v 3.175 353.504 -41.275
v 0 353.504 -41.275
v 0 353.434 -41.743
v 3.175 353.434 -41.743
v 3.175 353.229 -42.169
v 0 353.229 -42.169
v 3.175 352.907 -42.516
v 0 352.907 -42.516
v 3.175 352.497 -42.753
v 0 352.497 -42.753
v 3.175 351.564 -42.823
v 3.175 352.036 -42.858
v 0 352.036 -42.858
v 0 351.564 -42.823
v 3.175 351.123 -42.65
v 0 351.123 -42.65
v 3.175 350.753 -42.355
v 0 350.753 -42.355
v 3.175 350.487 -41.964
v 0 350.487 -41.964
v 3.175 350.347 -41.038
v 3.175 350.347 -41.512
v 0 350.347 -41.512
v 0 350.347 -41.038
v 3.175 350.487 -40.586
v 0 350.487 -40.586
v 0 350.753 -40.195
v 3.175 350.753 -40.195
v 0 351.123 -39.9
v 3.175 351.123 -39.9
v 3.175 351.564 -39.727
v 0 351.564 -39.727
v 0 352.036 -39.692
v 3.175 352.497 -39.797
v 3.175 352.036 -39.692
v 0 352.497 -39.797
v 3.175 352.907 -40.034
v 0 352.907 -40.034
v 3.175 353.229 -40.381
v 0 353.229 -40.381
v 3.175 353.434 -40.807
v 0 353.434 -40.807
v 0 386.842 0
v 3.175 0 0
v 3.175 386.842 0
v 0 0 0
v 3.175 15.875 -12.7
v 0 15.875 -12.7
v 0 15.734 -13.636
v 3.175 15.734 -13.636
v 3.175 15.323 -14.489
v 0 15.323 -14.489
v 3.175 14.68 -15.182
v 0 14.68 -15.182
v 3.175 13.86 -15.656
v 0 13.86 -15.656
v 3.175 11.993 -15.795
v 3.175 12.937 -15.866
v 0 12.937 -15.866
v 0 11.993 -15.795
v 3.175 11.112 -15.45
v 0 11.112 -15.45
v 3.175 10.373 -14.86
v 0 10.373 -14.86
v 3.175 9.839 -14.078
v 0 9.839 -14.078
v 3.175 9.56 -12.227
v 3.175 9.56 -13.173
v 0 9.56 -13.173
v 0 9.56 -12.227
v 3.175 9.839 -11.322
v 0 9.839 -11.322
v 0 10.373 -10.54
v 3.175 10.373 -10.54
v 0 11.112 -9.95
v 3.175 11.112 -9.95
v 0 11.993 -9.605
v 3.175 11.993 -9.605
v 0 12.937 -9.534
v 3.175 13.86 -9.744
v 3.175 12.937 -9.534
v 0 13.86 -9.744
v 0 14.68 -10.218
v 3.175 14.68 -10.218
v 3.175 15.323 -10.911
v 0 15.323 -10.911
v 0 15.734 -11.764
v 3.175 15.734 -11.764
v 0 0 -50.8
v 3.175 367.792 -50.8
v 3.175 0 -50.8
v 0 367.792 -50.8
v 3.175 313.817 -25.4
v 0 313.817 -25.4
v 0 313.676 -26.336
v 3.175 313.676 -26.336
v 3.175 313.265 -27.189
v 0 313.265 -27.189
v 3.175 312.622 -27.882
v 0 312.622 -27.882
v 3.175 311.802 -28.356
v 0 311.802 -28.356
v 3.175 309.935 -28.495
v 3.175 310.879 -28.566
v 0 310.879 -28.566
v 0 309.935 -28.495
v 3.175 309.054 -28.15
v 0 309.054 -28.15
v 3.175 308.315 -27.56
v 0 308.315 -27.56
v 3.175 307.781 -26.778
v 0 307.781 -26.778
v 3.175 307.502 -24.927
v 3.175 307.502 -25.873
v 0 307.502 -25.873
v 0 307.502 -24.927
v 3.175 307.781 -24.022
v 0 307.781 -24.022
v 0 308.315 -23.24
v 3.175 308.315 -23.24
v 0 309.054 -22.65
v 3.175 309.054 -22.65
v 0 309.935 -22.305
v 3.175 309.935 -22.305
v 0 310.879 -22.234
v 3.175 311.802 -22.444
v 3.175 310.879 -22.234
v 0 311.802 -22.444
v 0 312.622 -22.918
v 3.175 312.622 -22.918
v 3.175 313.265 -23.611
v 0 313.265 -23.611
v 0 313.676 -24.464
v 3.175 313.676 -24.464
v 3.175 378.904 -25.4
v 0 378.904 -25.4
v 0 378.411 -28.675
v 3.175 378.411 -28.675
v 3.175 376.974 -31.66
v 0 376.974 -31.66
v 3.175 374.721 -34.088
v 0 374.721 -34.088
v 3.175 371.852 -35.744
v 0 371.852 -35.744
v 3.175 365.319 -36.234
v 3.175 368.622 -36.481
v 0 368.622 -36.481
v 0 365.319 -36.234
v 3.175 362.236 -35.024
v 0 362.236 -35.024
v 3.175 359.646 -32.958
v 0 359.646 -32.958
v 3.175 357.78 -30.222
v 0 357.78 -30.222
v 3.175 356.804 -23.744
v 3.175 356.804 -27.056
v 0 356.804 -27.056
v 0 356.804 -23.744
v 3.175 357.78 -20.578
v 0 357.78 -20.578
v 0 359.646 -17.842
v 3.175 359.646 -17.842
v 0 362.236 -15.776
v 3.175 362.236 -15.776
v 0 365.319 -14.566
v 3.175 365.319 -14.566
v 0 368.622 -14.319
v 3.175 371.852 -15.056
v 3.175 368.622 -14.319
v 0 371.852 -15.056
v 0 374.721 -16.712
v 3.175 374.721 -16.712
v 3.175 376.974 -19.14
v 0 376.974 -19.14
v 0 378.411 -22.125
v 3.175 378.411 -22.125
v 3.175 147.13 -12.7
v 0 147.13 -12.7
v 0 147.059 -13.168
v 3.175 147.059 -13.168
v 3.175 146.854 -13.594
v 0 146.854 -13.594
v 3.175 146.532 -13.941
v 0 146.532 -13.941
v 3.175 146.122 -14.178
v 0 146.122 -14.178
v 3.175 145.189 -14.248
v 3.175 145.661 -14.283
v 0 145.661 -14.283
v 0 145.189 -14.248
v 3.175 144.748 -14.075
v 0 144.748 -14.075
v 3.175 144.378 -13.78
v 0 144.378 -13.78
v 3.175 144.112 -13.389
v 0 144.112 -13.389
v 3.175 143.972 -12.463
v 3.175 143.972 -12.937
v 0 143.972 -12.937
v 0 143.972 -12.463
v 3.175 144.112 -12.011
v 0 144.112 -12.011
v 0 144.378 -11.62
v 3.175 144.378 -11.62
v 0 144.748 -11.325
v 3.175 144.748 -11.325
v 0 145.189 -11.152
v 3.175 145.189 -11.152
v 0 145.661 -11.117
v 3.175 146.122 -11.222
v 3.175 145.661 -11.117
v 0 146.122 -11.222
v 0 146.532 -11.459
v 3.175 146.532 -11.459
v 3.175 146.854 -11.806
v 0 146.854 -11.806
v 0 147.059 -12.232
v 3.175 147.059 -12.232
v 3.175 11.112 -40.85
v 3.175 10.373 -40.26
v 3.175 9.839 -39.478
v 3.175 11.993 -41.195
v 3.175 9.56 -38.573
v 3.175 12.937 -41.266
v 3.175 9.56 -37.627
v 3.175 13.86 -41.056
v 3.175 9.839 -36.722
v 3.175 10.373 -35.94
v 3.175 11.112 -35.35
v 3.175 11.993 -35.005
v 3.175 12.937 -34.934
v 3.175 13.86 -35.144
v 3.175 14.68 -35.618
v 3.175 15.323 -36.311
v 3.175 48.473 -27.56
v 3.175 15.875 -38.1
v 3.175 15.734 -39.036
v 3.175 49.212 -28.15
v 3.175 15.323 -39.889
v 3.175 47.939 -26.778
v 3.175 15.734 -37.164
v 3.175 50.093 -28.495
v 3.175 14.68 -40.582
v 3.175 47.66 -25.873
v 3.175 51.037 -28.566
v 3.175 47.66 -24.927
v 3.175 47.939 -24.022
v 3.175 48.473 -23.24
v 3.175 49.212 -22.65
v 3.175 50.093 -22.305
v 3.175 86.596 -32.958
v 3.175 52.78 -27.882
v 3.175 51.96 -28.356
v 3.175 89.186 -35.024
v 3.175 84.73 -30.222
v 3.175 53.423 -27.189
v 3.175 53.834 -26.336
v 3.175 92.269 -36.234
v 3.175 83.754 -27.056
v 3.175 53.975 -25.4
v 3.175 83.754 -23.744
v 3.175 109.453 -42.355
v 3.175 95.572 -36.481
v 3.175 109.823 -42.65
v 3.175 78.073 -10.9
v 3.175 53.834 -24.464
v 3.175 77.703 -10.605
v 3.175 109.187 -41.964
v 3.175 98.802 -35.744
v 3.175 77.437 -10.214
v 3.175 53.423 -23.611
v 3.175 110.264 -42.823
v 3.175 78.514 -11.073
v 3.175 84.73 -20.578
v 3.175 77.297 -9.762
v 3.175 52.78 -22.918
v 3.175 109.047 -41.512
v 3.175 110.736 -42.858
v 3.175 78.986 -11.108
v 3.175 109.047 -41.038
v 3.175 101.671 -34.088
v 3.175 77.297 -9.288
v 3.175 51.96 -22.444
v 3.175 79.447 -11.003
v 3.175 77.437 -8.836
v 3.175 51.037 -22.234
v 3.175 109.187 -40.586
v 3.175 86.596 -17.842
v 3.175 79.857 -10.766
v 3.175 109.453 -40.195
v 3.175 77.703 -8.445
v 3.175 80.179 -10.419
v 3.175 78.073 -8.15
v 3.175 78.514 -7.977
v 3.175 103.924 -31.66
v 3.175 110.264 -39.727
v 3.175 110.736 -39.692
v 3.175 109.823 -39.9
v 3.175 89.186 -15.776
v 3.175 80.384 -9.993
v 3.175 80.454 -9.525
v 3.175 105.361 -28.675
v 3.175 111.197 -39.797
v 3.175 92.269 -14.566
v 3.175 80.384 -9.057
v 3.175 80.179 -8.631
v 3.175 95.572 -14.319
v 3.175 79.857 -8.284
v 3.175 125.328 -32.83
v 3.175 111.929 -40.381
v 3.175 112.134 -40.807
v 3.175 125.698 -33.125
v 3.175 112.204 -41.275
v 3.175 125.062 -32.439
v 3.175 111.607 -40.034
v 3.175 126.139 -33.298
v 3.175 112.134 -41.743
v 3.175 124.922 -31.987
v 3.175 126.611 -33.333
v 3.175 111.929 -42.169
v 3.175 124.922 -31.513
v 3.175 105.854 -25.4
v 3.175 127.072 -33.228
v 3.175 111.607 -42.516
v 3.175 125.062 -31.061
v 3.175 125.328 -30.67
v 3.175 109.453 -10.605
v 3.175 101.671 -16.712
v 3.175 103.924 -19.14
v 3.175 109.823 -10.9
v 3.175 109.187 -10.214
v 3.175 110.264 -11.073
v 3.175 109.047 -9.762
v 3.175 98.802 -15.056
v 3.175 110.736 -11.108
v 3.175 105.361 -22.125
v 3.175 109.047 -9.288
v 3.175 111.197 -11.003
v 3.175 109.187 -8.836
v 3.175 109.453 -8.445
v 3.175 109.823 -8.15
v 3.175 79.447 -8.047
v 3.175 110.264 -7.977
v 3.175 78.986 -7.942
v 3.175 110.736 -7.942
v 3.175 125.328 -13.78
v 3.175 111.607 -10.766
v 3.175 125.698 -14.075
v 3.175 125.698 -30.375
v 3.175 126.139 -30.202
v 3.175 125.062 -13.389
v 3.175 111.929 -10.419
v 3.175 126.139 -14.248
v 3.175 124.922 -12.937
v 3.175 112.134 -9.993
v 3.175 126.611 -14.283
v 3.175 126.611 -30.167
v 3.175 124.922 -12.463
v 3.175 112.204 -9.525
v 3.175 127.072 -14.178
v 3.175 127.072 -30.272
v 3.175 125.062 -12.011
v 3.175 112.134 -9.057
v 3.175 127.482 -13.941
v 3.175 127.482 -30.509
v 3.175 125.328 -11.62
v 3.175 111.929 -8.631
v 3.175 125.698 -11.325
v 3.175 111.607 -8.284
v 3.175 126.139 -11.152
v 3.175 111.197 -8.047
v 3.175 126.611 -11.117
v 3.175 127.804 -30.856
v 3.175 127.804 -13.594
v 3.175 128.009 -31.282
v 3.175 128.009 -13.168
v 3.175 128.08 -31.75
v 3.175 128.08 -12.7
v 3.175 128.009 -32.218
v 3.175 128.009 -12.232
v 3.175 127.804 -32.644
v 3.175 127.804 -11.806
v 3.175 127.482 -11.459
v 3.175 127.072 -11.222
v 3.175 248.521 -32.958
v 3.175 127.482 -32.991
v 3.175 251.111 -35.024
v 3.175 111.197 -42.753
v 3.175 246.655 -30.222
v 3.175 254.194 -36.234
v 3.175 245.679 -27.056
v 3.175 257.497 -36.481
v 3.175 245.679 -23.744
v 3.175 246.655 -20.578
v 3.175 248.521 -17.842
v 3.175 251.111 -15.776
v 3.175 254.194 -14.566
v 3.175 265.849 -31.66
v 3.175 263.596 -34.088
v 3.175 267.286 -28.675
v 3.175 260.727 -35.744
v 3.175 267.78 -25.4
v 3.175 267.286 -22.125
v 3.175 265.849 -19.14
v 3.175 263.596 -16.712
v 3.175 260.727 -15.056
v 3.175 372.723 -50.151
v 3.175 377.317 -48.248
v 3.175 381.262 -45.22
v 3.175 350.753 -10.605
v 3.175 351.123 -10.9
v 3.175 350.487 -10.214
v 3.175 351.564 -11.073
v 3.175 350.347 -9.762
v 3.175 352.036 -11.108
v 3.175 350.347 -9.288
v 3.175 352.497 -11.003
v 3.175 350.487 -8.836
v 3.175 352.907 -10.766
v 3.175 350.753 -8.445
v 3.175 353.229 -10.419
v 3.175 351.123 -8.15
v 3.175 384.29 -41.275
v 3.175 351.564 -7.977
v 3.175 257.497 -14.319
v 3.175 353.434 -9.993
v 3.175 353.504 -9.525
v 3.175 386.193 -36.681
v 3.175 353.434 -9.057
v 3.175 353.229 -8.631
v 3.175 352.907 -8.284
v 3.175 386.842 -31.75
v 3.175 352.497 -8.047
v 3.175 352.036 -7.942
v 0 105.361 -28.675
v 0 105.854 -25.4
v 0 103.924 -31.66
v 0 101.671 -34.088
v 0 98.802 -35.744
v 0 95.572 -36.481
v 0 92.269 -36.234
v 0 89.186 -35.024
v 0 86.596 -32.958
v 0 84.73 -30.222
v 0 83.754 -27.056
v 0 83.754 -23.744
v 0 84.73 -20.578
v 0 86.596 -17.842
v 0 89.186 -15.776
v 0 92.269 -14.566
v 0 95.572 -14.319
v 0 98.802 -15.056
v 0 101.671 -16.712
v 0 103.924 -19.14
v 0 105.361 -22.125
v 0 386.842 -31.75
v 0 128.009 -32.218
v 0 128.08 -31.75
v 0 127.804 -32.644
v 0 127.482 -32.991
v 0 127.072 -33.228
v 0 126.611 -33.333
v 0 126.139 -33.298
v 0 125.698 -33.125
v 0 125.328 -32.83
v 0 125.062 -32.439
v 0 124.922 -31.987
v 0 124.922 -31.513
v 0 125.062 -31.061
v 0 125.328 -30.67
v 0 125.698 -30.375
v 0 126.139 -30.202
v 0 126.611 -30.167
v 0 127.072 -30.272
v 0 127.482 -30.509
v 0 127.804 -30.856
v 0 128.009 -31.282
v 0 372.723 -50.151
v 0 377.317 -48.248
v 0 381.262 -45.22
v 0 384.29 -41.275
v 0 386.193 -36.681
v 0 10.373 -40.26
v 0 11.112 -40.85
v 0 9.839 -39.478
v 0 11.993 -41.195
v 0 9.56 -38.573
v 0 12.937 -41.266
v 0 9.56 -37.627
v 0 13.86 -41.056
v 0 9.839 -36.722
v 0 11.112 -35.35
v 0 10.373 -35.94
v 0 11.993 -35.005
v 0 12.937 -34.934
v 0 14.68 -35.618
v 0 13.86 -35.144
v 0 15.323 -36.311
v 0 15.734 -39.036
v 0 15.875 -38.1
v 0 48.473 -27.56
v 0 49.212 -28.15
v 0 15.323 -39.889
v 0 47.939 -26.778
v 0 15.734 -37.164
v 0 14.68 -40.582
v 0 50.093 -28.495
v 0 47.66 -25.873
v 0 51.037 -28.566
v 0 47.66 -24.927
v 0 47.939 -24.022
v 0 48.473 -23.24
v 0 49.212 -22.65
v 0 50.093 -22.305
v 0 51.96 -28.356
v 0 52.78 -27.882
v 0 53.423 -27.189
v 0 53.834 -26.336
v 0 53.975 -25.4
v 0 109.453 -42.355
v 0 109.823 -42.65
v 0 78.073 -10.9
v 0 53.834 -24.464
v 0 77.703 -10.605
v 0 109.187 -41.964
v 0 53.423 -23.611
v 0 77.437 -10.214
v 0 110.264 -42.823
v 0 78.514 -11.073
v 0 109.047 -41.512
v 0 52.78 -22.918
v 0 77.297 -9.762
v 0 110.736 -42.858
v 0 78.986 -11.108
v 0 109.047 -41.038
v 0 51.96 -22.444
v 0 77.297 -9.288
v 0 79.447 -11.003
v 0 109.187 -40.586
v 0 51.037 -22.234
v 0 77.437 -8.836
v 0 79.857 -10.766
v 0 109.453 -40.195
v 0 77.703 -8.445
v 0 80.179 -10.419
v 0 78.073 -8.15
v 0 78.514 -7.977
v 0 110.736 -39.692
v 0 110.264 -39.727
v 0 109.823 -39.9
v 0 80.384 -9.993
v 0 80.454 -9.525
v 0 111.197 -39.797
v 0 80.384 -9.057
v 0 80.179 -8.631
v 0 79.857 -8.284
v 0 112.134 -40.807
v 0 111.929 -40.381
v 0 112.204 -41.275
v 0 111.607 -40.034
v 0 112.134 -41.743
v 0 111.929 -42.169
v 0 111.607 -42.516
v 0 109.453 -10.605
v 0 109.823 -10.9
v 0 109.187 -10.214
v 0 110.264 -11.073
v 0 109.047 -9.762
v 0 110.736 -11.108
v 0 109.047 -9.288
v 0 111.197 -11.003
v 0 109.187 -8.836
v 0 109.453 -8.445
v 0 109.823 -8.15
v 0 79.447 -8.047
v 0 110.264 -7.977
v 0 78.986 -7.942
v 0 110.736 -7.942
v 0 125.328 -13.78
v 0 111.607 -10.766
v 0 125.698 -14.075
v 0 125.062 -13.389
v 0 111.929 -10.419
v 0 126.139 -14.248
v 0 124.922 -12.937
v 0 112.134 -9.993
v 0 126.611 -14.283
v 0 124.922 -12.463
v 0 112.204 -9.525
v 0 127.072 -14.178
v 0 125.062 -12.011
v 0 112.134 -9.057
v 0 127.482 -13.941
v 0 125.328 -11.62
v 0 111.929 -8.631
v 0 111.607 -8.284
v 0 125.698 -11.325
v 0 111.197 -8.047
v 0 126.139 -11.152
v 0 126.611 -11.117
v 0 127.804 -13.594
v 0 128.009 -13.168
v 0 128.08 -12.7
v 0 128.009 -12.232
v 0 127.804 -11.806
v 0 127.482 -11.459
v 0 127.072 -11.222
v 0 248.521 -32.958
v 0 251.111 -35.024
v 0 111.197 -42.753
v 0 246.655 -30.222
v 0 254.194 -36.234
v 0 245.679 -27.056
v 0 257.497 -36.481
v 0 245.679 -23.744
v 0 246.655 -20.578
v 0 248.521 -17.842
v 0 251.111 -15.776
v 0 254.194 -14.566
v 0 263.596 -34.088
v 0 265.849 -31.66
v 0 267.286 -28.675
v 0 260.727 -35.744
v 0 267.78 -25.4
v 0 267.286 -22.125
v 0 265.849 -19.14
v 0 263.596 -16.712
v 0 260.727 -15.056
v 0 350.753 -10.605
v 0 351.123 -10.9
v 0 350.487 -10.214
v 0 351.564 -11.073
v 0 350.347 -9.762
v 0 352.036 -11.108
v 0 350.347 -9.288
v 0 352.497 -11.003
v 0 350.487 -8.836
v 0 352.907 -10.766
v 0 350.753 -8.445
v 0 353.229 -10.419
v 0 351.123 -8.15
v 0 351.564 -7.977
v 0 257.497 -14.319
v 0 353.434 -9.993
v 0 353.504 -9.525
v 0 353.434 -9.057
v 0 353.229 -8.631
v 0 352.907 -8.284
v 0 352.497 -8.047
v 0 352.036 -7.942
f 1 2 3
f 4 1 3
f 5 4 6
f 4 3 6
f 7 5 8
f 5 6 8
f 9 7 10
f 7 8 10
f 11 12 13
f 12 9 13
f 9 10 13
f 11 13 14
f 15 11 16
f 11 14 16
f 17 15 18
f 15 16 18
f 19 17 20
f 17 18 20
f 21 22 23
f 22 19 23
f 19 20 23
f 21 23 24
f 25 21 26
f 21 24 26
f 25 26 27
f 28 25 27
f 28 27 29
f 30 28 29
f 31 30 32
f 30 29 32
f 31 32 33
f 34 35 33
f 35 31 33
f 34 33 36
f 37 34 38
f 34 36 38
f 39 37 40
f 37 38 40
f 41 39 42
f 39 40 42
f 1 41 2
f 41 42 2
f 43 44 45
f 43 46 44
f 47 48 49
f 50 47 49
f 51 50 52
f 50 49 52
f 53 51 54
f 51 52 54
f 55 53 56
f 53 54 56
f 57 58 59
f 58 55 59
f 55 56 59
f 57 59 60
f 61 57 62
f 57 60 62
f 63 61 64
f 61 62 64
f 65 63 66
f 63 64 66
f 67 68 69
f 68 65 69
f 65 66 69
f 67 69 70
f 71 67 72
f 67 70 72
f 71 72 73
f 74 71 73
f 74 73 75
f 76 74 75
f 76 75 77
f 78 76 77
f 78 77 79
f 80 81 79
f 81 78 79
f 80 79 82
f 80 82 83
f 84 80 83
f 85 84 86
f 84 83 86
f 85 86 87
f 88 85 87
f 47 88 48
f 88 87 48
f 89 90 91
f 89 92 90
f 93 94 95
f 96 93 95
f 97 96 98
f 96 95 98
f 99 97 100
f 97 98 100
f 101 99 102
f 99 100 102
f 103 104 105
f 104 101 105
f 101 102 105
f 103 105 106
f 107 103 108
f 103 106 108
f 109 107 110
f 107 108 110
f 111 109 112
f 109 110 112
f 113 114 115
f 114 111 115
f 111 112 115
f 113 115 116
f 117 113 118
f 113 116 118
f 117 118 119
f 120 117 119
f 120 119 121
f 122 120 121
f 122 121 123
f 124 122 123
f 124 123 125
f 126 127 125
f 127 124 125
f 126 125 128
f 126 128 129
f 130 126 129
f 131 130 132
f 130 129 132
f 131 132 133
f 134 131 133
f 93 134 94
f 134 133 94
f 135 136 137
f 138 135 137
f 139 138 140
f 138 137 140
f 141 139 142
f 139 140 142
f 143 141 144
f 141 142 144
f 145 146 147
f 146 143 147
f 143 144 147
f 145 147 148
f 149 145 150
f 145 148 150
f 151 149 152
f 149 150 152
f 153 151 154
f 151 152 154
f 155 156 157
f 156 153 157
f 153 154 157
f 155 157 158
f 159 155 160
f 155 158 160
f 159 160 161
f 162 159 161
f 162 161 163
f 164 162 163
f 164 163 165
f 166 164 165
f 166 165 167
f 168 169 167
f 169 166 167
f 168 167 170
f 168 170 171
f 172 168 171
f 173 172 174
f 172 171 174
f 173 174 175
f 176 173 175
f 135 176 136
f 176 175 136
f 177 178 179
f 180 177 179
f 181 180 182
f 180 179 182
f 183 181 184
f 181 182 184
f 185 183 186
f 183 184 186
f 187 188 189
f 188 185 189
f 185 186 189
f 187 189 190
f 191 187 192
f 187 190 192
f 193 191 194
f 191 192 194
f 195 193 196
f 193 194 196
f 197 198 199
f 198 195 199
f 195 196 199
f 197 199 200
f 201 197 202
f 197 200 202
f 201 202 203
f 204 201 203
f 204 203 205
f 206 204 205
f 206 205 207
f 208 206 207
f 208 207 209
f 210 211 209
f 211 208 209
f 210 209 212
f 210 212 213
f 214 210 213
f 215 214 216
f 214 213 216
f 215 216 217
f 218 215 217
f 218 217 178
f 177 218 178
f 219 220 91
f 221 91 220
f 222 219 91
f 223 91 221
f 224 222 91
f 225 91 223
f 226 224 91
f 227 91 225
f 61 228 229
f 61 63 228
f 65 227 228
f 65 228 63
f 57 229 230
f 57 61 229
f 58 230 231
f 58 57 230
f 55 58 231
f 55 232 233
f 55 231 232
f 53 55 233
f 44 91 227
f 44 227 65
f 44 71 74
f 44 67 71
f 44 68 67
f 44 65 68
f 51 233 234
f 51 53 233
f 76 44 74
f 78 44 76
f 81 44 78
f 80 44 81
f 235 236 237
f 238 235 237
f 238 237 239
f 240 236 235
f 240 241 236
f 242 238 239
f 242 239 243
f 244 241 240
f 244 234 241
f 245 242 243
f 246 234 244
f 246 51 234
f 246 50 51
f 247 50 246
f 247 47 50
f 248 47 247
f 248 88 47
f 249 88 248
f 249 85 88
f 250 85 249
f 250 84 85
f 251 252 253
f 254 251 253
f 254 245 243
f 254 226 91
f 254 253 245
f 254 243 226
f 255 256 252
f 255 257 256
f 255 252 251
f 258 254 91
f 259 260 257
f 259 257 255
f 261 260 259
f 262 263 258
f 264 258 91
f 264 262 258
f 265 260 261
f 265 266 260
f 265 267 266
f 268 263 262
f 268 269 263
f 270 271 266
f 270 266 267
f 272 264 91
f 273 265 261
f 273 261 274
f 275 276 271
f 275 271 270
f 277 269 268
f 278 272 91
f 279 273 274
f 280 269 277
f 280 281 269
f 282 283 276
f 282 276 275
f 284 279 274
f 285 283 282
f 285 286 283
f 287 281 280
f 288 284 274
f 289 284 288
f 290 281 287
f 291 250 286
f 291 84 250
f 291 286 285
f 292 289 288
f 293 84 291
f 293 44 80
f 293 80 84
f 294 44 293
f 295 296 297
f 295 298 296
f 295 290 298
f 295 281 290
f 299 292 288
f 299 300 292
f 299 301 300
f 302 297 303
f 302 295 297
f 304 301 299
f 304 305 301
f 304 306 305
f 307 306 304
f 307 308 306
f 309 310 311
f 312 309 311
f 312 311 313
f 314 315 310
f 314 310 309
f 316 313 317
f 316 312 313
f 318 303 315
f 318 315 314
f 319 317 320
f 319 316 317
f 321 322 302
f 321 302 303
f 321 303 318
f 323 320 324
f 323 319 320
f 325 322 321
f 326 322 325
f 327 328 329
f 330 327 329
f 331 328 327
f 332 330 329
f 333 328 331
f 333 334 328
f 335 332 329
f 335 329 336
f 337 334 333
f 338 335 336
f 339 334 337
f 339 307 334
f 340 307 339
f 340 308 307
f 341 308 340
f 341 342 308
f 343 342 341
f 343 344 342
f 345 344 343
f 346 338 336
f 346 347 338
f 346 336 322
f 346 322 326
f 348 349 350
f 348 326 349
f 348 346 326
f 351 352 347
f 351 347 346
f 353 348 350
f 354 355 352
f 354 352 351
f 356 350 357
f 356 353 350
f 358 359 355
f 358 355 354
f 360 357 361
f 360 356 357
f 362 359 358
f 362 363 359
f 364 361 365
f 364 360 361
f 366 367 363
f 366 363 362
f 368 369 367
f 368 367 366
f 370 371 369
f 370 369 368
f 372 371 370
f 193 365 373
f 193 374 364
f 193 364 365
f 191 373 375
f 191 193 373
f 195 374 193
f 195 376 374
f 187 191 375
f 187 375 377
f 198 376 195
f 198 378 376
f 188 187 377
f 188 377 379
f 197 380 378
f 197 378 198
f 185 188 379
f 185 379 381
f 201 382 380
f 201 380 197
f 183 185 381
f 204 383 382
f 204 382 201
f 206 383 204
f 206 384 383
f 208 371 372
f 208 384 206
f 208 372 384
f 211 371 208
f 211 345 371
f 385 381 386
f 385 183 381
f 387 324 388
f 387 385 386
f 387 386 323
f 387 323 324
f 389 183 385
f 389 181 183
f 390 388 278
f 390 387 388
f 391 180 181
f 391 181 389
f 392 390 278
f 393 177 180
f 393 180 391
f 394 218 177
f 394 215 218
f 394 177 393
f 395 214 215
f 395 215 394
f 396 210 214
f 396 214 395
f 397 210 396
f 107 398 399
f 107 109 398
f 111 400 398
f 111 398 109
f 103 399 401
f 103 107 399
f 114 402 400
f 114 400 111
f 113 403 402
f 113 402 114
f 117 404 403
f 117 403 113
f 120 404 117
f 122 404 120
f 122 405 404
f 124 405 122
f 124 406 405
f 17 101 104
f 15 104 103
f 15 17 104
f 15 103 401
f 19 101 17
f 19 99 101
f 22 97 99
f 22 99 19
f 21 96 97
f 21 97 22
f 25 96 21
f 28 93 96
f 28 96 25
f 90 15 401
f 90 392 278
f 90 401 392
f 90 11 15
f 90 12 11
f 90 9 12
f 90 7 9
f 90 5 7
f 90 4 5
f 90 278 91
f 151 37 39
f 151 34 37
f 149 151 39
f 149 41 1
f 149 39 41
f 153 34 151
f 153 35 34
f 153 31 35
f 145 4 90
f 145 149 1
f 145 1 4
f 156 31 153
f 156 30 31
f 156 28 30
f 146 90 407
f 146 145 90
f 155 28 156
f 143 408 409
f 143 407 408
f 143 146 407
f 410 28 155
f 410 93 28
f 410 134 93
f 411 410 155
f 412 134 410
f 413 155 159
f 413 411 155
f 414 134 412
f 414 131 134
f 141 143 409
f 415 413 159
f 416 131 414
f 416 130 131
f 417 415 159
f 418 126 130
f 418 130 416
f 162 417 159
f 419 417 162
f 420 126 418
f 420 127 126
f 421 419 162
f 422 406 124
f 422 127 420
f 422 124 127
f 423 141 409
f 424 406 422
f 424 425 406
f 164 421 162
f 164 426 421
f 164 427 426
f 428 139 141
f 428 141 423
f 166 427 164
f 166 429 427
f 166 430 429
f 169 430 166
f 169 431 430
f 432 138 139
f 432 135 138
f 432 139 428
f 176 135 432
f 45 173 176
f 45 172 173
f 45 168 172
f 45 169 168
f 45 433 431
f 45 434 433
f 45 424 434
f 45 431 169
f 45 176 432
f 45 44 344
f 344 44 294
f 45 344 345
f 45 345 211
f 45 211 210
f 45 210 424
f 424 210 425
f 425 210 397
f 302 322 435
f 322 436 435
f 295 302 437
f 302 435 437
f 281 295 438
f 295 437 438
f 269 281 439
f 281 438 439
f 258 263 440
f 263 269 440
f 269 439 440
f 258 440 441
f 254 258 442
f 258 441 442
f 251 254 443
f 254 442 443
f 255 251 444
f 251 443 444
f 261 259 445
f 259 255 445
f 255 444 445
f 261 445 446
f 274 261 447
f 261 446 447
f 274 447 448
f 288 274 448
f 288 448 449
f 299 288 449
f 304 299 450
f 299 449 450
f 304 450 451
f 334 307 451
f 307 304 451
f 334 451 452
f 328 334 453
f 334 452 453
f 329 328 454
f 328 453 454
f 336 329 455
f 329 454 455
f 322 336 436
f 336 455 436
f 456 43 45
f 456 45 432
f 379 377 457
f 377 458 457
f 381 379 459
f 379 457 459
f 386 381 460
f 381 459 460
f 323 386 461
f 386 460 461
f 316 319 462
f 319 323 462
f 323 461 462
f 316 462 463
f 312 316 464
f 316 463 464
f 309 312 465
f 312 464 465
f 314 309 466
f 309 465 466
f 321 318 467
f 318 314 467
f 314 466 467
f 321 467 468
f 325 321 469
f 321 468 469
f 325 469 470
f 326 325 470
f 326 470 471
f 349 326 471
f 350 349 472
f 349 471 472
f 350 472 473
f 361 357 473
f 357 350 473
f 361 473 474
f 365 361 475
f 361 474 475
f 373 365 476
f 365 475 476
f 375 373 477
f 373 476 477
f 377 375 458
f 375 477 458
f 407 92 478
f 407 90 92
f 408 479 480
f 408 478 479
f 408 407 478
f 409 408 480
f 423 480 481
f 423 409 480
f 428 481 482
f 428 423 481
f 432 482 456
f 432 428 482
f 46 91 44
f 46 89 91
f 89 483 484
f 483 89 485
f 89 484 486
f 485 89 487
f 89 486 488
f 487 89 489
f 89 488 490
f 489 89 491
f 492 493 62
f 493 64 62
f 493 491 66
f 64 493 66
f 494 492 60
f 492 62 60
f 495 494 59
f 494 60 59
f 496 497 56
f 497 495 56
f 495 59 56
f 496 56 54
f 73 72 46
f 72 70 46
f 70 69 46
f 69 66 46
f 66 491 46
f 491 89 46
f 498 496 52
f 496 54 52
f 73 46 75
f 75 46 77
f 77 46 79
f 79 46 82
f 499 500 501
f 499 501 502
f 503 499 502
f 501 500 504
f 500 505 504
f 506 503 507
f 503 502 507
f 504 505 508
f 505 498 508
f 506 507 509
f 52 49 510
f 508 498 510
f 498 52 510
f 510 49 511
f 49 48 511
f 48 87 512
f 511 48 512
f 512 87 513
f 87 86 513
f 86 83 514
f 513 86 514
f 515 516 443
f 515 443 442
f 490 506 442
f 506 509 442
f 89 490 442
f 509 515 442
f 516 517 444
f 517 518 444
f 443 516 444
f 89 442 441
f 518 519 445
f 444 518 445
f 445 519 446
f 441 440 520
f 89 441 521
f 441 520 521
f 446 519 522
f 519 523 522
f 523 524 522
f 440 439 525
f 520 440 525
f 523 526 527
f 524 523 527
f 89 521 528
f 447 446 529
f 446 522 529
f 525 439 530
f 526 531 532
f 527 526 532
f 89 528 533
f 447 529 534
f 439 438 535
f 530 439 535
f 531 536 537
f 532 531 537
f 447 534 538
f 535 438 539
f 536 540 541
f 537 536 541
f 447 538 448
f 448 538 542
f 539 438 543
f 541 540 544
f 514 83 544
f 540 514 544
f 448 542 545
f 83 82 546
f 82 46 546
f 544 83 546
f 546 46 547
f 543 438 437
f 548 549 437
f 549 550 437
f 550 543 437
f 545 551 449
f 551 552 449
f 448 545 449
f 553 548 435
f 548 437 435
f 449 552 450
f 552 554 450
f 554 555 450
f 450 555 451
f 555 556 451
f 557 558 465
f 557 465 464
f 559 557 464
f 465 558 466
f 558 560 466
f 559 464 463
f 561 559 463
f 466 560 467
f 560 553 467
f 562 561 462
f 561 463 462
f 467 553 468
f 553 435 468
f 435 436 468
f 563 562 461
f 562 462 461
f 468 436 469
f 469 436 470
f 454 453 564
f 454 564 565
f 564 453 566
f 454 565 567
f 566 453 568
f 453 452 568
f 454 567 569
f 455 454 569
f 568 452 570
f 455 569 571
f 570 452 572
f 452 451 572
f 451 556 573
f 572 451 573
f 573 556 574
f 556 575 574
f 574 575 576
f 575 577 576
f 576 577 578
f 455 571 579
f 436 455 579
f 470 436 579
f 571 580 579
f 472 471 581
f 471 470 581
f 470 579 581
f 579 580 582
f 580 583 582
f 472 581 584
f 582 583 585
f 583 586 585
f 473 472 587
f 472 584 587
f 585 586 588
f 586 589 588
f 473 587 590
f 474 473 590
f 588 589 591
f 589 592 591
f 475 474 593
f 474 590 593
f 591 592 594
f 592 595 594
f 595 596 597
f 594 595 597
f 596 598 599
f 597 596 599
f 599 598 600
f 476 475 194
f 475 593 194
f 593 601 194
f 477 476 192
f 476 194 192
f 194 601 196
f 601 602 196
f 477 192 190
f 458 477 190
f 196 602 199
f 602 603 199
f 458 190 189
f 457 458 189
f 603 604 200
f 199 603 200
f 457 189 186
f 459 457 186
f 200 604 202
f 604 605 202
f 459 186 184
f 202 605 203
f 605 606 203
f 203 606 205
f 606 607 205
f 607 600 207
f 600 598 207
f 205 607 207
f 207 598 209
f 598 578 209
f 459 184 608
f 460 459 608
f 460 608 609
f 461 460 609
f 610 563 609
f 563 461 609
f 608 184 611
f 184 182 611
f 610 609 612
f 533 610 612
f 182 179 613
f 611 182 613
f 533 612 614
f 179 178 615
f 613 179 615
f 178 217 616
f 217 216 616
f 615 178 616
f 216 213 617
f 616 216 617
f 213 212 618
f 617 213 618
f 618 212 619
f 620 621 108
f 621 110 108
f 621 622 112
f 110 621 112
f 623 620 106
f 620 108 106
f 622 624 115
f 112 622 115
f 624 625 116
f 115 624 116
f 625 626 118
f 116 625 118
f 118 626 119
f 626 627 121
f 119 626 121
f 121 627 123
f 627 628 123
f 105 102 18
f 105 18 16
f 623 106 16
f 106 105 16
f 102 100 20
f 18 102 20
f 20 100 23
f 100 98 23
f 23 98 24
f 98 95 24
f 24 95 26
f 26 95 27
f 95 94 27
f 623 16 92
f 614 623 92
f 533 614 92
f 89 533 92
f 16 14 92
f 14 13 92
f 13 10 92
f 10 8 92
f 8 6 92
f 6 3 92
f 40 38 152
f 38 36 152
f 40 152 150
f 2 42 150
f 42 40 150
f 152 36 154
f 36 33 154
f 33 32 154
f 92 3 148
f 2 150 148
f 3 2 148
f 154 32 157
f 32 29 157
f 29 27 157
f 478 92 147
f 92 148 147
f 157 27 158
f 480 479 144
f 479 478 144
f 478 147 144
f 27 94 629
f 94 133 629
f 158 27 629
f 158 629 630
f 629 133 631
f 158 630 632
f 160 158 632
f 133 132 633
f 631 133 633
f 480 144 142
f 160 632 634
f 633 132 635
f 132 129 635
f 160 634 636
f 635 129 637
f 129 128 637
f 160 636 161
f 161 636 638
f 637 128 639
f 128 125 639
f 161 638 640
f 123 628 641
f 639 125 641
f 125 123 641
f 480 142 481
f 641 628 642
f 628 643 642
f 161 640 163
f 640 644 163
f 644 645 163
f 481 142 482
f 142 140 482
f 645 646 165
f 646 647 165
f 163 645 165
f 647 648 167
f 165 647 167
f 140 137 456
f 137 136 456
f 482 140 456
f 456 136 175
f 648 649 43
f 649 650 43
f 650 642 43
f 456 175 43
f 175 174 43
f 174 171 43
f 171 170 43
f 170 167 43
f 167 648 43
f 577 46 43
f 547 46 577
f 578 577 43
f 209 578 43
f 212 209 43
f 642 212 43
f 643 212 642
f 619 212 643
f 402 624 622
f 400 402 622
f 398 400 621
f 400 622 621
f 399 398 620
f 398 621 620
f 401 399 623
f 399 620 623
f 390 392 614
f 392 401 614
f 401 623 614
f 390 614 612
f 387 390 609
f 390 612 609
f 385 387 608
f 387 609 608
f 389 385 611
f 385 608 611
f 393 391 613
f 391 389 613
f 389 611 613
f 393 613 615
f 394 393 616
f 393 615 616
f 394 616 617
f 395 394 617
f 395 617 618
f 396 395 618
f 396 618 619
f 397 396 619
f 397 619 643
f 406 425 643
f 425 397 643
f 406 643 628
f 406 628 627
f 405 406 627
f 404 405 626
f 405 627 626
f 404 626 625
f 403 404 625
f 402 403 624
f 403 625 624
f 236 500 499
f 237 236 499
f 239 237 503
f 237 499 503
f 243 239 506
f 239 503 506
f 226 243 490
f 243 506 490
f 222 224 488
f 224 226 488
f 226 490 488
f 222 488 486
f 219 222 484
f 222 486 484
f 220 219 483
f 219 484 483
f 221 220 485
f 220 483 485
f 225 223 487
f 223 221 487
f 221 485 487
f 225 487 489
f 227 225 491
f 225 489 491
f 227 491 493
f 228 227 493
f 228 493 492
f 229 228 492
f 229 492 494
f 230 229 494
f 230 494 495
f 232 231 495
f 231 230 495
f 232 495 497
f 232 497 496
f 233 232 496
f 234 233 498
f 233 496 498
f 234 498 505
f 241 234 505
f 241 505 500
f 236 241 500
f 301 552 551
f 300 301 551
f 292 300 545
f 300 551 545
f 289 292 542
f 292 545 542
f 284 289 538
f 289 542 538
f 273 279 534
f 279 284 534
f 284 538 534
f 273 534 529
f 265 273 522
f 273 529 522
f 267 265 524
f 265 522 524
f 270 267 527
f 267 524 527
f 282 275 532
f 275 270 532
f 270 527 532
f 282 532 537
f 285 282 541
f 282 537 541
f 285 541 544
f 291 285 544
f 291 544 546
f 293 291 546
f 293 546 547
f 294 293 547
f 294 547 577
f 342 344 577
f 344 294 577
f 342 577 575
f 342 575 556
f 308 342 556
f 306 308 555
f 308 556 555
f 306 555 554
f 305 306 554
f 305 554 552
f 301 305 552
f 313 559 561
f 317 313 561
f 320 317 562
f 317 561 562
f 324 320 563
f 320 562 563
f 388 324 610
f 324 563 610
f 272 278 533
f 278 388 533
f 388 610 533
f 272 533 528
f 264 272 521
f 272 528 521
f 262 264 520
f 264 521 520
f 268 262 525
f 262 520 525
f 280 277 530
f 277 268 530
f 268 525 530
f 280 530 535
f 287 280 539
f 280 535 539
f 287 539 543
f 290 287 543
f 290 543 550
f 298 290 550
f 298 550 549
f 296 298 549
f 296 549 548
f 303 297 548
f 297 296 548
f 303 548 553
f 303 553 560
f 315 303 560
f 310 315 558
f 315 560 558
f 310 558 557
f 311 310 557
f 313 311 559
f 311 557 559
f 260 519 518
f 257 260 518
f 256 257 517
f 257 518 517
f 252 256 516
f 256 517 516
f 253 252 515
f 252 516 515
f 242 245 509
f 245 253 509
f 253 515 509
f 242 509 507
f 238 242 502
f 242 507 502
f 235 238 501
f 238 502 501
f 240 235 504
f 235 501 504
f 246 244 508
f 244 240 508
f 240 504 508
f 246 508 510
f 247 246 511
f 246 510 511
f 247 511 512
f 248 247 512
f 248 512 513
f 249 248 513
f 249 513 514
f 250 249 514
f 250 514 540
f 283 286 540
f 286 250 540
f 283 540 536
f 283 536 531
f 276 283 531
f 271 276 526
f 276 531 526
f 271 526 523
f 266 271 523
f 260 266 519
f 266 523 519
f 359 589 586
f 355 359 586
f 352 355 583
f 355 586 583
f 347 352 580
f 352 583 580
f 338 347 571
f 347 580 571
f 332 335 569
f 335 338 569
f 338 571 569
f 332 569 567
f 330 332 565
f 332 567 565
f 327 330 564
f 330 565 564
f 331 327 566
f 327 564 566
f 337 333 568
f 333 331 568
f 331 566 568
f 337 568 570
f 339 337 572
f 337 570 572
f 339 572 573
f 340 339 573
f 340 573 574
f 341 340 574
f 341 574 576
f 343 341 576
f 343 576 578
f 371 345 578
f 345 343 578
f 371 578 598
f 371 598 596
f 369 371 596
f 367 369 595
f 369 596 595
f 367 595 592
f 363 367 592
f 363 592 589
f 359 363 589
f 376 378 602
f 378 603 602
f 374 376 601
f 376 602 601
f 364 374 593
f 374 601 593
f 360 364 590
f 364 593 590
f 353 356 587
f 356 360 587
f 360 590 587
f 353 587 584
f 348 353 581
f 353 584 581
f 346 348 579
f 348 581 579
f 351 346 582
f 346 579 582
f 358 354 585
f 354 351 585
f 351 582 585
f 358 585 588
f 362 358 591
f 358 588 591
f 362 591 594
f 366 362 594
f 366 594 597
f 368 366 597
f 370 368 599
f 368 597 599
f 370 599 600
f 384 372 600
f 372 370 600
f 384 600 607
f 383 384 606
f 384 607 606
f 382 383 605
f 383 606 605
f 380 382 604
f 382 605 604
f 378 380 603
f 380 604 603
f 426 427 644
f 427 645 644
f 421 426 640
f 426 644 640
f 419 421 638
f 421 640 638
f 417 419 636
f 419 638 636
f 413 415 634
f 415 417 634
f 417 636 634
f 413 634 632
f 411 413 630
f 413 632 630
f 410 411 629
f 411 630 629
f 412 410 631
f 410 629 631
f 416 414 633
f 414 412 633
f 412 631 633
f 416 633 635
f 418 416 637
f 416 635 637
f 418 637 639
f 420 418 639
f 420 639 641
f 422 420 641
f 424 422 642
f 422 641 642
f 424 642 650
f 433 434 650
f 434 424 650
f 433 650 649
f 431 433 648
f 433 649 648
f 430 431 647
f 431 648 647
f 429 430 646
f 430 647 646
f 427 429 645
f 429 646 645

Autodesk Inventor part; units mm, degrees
ref_plane "YZ Plane" through (0, 0, 0) normal (1, 0, 0) x (0, 1, 0)
ref_plane "XZ Plane" through (0, 0, 0) normal (0, 1, 0) x (-1, 0, 0)
ref_plane "XY Plane" through (0, 0, 0) normal (0, 0, 1) x (1, 0, 0)
sketch "Sketch1" plane through (0, 0, 0) normal (1, 0, 0) x (0, 1, 0)
  line L0 (386.842, -25.4) -> (0, -25.4) construction
  circle A0 centre (94.742, -25.4) radius 11.1125
  circle A1 centre (367.792, -25.4) radius 11.1125
  circle A2 centre (256.667, -25.4) radius 11.1125
  circle A3 centre (310.642, -25.4) radius 3.175
  line L1 (0, 0) -> (386.842, 0)
  line L2 (386.842, 0) -> (386.842, -50.8)
  line L3 (386.842, -50.8) -> (0, -50.8)
  line L4 (0, -50.8) -> (0, 0)
  line L5 (78.867, -9.525) -> (110.617, -9.525) construction
  line L6 (110.617, -9.525) -> (110.617, -41.275) construction
  circle A4 centre (110.617, -9.525) radius 1.5875
  circle A5 centre (110.617, -41.275) radius 1.5875
  circle A6 centre (78.867, -9.525) radius 1.5875
  line L7 (351.917, -9.525) -> (351.917, -41.275) construction
  circle A7 centre (351.917, -41.275) radius 1.5875
  circle A8 centre (351.917, -9.525) radius 1.5875
  line L8 (12.7, -50.8) -> (12.7, 0) construction
  circle A9 centre (12.7, -38.1) radius 3.175
  circle A10 centre (12.7, -12.7) radius 3.175
  line L9 (126.492, 0) -> (126.492, -50.8) construction
  line L10 (126.492, -12.7) -> (145.542, -12.7) construction
  circle A11 centre (126.492, -12.7) radius 1.5875
  circle A12 centre (145.542, -12.7) radius 1.5875
  circle A13 centre (126.492, -31.75) radius 1.5875
  circle A14 centre (50.8, -25.4) radius 3.175
  point P0 (351.917, -25.4)
  dimension "d3" = 22.225
  dimension "d4" = 273.05
  dimension "d9" = 161.925
  dimension "d12" = 6.35
  dimension "d13" = 57.15
  dimension "d15" = 50.8
  dimension "d16" = 19.05
  dimension "d17" = 94.742
  dimension "d18" = 3.175
  dimension "d19" = 9.525
  dimension "d20" = 31.75
  dimension "d22" = 15.875
  dimension "d23" = 3.175
  dimension "d24" = 15.875
  dimension "d25" = 31.75
  dimension "d26" = 6.35
  dimension "d27" = 12.7
  dimension "d28" = 25.4
  dimension "d29" = 19.05
  dimension "d30" = 19.05
  dimension "d31" = 6.35
  dimension "d32" = 31.75
  dimension "d33" = 38.1
extrude "Extrusion1" add sketch "Sketch1" along normal blind 3.175
fillet "Fillet1" radius 19.05 1 edges at (1.5875, 386.842, -50.8)
equation "\"d30\" = d29"
properties part number "Back Plate"
